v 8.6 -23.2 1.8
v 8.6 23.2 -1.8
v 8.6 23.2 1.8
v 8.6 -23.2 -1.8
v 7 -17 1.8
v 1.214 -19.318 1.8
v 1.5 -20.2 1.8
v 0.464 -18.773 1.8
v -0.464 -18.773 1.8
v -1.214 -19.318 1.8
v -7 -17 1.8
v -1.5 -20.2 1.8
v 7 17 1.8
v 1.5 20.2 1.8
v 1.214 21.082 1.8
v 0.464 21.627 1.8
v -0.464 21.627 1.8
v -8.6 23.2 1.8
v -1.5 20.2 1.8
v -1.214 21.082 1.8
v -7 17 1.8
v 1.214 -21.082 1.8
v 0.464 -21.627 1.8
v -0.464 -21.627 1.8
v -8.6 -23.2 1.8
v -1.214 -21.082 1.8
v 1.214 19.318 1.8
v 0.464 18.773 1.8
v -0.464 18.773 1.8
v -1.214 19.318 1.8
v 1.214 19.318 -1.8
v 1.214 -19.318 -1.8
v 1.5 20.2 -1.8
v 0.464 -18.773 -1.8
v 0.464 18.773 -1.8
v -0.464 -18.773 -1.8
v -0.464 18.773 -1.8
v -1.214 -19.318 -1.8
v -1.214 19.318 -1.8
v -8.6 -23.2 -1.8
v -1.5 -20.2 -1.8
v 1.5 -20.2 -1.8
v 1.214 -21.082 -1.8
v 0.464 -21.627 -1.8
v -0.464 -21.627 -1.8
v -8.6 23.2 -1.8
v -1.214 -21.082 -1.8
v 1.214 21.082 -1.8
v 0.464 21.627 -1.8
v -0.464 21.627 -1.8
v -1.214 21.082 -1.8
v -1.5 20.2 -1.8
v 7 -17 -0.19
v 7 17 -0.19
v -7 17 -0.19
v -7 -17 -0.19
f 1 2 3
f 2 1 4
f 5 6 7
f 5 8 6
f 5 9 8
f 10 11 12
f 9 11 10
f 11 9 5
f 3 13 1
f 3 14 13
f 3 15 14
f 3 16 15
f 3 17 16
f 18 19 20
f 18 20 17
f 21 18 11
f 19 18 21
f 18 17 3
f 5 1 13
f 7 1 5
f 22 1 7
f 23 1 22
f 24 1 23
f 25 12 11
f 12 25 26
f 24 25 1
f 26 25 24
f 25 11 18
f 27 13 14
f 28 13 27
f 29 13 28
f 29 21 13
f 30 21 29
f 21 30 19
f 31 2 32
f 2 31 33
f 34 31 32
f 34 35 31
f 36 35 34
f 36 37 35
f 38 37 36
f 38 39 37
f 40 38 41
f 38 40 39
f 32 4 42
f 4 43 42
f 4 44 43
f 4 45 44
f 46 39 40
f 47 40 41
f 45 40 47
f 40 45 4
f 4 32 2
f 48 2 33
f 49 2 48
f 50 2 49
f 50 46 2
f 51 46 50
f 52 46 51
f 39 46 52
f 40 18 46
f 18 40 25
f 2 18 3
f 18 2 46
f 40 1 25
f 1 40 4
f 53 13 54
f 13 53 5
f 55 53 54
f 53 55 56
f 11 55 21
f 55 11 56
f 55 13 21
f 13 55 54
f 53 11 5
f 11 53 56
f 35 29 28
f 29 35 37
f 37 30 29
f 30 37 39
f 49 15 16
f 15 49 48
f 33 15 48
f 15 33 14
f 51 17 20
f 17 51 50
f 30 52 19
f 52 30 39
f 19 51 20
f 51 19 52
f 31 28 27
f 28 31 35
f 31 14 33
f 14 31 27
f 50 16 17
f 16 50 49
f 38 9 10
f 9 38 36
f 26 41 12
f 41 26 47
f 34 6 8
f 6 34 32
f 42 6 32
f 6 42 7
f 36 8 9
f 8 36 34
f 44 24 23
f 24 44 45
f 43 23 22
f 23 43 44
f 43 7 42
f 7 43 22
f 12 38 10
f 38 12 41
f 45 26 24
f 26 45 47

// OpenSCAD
$fs=1/1;
$fa=1/1;
bissl=1/100;
part="bottom";//[bottom,top]
width=14;
height=34;
thickness=4;
wall=1.6;
hole=3;
border=1.5;
difference() {
  cube([width+2*wall,height+4*wall+2*hole,thickness/2+wall],center=true);
  translate([0,0,wall/2+bissl])cube([width,height,thickness/2],center=true);
  translate([0,height/2+2*wall,0]) cylinder(d=hole,h=wall+thickness/2+bissl,center=true);
  translate([0,-height/2-2*wall,0]) cylinder(d=hole,h=wall+thickness/2+bissl,center=true);
  if (part=="top") translate([0,0,-wall/2-bissl])cube([width-2*border,height-2*border,thickness/2],center=true);
}
